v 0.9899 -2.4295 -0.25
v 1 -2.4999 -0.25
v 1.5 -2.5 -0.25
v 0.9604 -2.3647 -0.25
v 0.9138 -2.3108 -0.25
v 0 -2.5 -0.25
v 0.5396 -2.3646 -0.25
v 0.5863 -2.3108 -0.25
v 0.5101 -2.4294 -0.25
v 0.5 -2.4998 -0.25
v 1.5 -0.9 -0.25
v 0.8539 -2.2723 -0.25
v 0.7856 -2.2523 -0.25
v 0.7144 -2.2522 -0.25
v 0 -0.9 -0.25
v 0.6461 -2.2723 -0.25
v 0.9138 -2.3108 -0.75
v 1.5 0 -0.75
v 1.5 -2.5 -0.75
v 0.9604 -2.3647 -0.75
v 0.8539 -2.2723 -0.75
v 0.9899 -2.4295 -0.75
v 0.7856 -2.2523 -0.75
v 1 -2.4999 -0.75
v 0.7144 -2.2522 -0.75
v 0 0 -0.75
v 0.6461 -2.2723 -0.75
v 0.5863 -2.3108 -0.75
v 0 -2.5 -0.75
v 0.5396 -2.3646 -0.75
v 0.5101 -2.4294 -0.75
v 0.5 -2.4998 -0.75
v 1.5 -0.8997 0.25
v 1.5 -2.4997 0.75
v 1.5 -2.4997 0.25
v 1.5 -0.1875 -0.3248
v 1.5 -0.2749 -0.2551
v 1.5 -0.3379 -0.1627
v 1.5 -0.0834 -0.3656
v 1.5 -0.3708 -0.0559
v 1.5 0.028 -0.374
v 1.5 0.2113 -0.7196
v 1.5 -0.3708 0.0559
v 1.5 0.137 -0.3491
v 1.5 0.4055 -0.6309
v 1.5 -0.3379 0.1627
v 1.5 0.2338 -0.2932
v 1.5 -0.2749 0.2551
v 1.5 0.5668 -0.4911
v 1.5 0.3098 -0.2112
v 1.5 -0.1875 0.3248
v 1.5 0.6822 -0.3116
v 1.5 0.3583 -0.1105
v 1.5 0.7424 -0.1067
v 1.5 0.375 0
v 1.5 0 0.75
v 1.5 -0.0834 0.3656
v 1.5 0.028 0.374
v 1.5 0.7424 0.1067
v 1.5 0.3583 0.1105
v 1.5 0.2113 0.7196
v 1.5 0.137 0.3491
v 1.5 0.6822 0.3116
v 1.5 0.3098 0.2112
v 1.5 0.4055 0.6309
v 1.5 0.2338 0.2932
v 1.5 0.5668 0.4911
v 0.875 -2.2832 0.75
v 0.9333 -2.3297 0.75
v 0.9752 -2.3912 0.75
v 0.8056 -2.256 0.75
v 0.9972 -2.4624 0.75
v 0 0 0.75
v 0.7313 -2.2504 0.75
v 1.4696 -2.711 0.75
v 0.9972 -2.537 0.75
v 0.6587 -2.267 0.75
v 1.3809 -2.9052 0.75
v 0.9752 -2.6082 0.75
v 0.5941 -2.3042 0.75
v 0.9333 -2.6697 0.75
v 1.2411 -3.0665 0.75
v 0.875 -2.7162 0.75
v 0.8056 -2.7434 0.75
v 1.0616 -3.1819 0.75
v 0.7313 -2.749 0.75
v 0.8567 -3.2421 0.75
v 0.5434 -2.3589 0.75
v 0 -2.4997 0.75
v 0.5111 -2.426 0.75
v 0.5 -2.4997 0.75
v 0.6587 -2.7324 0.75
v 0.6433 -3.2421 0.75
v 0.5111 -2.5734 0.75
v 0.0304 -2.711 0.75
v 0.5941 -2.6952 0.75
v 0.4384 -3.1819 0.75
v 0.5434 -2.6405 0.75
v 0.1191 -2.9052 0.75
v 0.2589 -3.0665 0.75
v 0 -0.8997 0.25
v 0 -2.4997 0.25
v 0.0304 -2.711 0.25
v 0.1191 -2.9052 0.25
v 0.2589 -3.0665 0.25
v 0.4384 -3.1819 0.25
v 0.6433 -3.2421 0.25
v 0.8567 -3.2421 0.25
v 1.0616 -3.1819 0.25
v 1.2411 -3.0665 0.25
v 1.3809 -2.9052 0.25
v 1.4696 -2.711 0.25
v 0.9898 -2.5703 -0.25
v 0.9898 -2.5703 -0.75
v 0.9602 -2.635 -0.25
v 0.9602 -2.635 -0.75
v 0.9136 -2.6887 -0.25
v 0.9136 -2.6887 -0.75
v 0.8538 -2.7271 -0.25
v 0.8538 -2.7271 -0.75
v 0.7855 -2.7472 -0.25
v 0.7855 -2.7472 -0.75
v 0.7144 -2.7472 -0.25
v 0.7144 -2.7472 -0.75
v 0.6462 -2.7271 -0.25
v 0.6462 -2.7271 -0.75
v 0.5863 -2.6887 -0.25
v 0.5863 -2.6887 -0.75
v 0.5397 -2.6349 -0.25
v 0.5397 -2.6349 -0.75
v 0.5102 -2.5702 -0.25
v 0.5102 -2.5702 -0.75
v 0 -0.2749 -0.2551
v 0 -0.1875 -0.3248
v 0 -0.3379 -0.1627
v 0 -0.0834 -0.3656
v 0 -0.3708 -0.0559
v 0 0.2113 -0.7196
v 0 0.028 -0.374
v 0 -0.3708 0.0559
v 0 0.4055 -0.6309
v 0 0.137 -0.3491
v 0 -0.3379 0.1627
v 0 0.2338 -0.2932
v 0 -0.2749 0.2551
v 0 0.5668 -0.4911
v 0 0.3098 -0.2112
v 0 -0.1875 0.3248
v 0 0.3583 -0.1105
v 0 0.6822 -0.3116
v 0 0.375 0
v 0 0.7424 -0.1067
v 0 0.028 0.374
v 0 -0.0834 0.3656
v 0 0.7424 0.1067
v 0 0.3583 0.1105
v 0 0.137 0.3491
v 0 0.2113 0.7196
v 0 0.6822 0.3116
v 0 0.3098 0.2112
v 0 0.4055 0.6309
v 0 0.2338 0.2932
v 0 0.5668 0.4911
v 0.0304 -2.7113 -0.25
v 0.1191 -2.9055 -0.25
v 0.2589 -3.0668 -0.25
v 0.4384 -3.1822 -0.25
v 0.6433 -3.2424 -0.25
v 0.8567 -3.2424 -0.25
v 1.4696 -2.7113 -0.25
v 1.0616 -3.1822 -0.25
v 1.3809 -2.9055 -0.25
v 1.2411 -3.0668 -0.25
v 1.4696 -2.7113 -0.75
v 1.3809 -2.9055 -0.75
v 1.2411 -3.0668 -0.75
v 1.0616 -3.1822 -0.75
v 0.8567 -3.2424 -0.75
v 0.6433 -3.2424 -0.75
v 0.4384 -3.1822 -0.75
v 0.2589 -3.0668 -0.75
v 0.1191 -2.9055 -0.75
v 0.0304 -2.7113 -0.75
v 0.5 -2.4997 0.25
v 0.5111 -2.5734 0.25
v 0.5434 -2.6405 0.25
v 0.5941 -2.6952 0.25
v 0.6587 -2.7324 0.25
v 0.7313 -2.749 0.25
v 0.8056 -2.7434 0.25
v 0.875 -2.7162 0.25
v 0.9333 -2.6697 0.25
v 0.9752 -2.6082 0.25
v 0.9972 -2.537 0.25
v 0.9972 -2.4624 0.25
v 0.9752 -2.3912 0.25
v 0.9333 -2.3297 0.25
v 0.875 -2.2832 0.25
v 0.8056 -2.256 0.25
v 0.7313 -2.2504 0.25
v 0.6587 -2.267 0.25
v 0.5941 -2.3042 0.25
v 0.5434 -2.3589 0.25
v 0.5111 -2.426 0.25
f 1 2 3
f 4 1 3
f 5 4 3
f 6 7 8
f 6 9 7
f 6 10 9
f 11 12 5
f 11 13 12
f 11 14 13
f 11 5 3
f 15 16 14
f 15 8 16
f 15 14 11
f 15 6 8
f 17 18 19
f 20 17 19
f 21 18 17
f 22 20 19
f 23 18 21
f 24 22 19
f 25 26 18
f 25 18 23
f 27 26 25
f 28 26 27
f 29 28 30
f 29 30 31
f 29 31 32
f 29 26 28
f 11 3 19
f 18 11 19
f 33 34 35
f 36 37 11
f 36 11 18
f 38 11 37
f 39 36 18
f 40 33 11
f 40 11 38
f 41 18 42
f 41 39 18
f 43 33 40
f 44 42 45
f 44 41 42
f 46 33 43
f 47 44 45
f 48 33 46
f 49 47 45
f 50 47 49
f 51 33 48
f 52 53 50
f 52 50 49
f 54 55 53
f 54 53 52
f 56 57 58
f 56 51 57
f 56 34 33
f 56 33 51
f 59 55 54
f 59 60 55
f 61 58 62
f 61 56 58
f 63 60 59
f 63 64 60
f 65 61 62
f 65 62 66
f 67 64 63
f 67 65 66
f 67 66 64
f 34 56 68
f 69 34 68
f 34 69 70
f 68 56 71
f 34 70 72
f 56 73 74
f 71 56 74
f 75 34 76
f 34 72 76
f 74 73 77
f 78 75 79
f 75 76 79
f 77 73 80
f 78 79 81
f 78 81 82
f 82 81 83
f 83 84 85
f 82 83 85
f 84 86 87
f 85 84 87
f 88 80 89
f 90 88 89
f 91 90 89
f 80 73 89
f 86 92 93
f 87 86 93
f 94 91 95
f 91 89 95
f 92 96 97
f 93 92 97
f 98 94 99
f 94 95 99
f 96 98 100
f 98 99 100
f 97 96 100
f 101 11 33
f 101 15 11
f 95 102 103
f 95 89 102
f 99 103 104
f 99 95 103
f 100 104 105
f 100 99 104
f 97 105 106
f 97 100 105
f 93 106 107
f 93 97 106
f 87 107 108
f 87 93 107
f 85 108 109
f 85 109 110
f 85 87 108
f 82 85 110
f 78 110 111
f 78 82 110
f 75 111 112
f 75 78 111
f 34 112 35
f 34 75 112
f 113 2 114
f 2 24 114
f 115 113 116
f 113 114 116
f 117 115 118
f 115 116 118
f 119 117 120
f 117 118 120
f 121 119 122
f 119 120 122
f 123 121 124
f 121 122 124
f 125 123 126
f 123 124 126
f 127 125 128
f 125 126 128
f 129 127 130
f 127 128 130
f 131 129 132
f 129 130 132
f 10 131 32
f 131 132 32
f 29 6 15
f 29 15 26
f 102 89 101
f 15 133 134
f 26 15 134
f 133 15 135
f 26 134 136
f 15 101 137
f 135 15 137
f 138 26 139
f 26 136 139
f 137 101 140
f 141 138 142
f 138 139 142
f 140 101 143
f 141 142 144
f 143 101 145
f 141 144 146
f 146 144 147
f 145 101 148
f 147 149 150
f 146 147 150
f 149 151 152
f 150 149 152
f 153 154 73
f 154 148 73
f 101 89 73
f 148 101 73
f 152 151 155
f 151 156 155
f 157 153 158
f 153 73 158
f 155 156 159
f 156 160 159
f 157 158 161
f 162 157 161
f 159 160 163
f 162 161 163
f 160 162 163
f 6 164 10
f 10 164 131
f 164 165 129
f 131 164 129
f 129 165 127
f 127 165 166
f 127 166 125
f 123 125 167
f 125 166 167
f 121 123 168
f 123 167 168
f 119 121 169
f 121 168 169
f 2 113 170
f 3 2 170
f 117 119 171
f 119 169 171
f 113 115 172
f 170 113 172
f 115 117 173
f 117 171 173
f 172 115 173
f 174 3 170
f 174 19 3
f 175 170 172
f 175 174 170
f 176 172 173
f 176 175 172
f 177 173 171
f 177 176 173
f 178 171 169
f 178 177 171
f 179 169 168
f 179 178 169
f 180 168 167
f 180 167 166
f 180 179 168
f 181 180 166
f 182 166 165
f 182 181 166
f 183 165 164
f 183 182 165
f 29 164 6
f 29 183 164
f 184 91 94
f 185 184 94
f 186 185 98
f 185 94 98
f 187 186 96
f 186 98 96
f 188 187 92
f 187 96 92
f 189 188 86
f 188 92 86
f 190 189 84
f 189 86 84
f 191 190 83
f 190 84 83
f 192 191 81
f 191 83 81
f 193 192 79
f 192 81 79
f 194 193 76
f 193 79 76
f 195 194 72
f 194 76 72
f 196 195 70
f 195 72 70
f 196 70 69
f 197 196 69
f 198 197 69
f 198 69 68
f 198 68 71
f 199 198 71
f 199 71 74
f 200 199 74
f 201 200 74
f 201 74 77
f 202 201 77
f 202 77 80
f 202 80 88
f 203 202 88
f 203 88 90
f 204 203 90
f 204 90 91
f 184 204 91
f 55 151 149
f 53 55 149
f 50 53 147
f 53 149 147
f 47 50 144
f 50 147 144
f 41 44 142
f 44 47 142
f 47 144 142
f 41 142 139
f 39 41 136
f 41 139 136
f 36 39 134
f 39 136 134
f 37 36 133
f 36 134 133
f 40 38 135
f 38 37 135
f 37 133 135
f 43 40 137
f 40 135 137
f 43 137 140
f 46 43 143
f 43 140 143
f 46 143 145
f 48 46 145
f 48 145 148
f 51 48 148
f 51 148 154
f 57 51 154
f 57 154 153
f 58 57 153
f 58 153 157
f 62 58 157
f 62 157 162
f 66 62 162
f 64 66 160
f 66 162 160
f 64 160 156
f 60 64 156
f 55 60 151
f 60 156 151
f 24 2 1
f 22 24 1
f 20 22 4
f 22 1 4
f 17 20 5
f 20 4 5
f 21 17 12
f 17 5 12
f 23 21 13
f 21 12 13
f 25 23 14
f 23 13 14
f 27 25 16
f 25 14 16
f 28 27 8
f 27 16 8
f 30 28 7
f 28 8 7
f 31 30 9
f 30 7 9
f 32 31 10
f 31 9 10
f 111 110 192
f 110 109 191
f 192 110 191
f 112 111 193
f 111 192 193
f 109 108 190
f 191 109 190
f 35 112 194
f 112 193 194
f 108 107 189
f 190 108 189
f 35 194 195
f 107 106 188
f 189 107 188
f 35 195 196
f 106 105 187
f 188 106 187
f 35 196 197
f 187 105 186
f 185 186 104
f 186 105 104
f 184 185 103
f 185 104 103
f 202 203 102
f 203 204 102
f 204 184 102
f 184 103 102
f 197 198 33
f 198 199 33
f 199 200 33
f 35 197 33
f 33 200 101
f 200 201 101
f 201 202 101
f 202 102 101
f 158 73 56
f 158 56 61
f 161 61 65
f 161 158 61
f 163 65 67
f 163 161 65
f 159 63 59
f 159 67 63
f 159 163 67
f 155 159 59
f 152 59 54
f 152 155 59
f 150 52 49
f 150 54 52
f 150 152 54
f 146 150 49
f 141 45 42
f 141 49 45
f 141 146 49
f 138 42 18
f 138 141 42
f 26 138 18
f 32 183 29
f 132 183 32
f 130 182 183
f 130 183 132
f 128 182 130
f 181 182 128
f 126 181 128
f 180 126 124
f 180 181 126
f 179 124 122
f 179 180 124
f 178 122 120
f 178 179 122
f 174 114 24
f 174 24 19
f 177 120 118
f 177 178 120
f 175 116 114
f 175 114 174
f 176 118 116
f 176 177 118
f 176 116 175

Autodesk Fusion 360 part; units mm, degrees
sketch "Sketch1" plane through (0, 0, 0) normal (1, 0, 0) x (0, 1, 0)
  circle A0 centre (0, 0) radius 0.375
  arc A1 (0, -0.75) -> (0, 0.75) centre (0, 0) ccw
  line L0 (0, 0.75) -> (-2.4997, 0.75)
  line L1 (0, -0.75) -> (-2.5, -0.75)
  line L2 (-2.4997, 0.75) -> (-2.4997, 0.25)
  line L3 (-2.5, -0.75) -> (-2.5, -0.25)
  line L4 (-2.4997, 0.25) -> (-0.8997, 0.25)
  line L5 (-2.5, -0.25) -> (-0.9, -0.25)
  line L6 (-0.9, -0.25) -> (-0.8997, 0.25)
  dimension "d9" = 0.5
  dimension "d10" = 0.5
  dimension "d11" = 1.6
  dimension "d12" = 1.6
extrude "Extrude1" add sketch "Sketch1" along normal blind 1.5
sketch "Sketch2" plane through (0, 0, 0.75) normal (0, 0, 1) x (-1, 0, 0)
  line L0 (0, 0) -> (0, 2.4997)
  line L1 (0, 2.4997) -> (-1.5, 2.4997)
  line L2 (-1.5, 2.4997) -> (-1.5, 0)
  line L3 (-1.5, 0) -> (0, 0)
  arc A0 (0, 2.4997) -> (-1.5, 2.4997) centre (-0.75, 2.4997) ccw
  line L4 (0, 2.4997) -> (-1.5, 2.4997)
  circle A1 centre (-0.75, 2.4997) radius 0.25
  dimension "d15" = 0.5
extrude "Extrude2" add sketch "Sketch2" against normal blind 0.5 contours L1 A0 L4 A1 | L1 L4 A1 picked at (-0.6889, 2.5564)
sketch "Sketch3" plane through (0, 0, 0.75) normal (0, 0, 1) x (-1, 0, 0)
  line L0 (0, 0) -> (0, 2.4997)
  arc A0 (0, 2.4997) -> (-1.5, 2.4997) centre (-0.75, 2.4997) ccw
  line L1 (-1.5, 2.4997) -> (-1.5, 0)
  line L2 (-1.5, 0) -> (0, 0)
  circle A1 centre (-0.75, 2.4997) radius 0.25
  dimension "d18" = 0.5
extrude "Extrude3" cut sketch "Sketch3" against normal through all contours A1
sketch "Sketch4" plane through (0, 0, -0.75) normal (0, 0, -1) x (1, 0, 0)
  arc A0 (0.5, 2.5) -> (1, 2.5) centre (0.75, 2.4997) ccw
  line L0 (0.5, 2.5) -> (0, 2.5)
  line L1 (0, 2.5) -> (0, 0)
  line L2 (0, 0) -> (1.5, 0)
  line L3 (1.5, 0) -> (1.5, 2.5)
  line L4 (1.5, 2.5) -> (1, 2.5)
  line L5 (0, 2.5) -> (1.5, 2.5)
  arc A1 (1.5, 2.5) -> (0, 2.5) centre (0.75, 2.5) ccw
  circle A2 centre (0.75, 2.4997) radius 0.25
  dimension "d20" = 0.5
extrude "Extrude4" add sketch "Sketch4" against normal blind 0.5 contours L0 L4 L5 A1 A2
sketch "Sketch5" plane through (1.5, 0, 0) normal (1, 0, 0) x (0, 1, 0)
  circle A0 centre (0, 0) radius 0.375
  arc A1 (0, -0.75) -> (0, 0.75) centre (0, 0) ccw
  line L0 (0, 0.75) -> (-2.4997, 0.75)
  line L1 (-2.4997, 0.75) -> (-2.4997, 0.25)
  line L2 (-2.4997, 0.25) -> (-0.8997, 0.25)
  line L3 (-0.8997, 0.25) -> (-0.9, -0.25)
  line L4 (-0.9, -0.25) -> (-2.5, -0.25)
  line L5 (-2.5, -0.25) -> (-2.5, -0.75)
  line L6 (-2.5, -0.75) -> (0, -0.75)
  dimension "d23" = 2.4997
  dimension "d24" = 1.6
  dimension "d25" = 0.75
